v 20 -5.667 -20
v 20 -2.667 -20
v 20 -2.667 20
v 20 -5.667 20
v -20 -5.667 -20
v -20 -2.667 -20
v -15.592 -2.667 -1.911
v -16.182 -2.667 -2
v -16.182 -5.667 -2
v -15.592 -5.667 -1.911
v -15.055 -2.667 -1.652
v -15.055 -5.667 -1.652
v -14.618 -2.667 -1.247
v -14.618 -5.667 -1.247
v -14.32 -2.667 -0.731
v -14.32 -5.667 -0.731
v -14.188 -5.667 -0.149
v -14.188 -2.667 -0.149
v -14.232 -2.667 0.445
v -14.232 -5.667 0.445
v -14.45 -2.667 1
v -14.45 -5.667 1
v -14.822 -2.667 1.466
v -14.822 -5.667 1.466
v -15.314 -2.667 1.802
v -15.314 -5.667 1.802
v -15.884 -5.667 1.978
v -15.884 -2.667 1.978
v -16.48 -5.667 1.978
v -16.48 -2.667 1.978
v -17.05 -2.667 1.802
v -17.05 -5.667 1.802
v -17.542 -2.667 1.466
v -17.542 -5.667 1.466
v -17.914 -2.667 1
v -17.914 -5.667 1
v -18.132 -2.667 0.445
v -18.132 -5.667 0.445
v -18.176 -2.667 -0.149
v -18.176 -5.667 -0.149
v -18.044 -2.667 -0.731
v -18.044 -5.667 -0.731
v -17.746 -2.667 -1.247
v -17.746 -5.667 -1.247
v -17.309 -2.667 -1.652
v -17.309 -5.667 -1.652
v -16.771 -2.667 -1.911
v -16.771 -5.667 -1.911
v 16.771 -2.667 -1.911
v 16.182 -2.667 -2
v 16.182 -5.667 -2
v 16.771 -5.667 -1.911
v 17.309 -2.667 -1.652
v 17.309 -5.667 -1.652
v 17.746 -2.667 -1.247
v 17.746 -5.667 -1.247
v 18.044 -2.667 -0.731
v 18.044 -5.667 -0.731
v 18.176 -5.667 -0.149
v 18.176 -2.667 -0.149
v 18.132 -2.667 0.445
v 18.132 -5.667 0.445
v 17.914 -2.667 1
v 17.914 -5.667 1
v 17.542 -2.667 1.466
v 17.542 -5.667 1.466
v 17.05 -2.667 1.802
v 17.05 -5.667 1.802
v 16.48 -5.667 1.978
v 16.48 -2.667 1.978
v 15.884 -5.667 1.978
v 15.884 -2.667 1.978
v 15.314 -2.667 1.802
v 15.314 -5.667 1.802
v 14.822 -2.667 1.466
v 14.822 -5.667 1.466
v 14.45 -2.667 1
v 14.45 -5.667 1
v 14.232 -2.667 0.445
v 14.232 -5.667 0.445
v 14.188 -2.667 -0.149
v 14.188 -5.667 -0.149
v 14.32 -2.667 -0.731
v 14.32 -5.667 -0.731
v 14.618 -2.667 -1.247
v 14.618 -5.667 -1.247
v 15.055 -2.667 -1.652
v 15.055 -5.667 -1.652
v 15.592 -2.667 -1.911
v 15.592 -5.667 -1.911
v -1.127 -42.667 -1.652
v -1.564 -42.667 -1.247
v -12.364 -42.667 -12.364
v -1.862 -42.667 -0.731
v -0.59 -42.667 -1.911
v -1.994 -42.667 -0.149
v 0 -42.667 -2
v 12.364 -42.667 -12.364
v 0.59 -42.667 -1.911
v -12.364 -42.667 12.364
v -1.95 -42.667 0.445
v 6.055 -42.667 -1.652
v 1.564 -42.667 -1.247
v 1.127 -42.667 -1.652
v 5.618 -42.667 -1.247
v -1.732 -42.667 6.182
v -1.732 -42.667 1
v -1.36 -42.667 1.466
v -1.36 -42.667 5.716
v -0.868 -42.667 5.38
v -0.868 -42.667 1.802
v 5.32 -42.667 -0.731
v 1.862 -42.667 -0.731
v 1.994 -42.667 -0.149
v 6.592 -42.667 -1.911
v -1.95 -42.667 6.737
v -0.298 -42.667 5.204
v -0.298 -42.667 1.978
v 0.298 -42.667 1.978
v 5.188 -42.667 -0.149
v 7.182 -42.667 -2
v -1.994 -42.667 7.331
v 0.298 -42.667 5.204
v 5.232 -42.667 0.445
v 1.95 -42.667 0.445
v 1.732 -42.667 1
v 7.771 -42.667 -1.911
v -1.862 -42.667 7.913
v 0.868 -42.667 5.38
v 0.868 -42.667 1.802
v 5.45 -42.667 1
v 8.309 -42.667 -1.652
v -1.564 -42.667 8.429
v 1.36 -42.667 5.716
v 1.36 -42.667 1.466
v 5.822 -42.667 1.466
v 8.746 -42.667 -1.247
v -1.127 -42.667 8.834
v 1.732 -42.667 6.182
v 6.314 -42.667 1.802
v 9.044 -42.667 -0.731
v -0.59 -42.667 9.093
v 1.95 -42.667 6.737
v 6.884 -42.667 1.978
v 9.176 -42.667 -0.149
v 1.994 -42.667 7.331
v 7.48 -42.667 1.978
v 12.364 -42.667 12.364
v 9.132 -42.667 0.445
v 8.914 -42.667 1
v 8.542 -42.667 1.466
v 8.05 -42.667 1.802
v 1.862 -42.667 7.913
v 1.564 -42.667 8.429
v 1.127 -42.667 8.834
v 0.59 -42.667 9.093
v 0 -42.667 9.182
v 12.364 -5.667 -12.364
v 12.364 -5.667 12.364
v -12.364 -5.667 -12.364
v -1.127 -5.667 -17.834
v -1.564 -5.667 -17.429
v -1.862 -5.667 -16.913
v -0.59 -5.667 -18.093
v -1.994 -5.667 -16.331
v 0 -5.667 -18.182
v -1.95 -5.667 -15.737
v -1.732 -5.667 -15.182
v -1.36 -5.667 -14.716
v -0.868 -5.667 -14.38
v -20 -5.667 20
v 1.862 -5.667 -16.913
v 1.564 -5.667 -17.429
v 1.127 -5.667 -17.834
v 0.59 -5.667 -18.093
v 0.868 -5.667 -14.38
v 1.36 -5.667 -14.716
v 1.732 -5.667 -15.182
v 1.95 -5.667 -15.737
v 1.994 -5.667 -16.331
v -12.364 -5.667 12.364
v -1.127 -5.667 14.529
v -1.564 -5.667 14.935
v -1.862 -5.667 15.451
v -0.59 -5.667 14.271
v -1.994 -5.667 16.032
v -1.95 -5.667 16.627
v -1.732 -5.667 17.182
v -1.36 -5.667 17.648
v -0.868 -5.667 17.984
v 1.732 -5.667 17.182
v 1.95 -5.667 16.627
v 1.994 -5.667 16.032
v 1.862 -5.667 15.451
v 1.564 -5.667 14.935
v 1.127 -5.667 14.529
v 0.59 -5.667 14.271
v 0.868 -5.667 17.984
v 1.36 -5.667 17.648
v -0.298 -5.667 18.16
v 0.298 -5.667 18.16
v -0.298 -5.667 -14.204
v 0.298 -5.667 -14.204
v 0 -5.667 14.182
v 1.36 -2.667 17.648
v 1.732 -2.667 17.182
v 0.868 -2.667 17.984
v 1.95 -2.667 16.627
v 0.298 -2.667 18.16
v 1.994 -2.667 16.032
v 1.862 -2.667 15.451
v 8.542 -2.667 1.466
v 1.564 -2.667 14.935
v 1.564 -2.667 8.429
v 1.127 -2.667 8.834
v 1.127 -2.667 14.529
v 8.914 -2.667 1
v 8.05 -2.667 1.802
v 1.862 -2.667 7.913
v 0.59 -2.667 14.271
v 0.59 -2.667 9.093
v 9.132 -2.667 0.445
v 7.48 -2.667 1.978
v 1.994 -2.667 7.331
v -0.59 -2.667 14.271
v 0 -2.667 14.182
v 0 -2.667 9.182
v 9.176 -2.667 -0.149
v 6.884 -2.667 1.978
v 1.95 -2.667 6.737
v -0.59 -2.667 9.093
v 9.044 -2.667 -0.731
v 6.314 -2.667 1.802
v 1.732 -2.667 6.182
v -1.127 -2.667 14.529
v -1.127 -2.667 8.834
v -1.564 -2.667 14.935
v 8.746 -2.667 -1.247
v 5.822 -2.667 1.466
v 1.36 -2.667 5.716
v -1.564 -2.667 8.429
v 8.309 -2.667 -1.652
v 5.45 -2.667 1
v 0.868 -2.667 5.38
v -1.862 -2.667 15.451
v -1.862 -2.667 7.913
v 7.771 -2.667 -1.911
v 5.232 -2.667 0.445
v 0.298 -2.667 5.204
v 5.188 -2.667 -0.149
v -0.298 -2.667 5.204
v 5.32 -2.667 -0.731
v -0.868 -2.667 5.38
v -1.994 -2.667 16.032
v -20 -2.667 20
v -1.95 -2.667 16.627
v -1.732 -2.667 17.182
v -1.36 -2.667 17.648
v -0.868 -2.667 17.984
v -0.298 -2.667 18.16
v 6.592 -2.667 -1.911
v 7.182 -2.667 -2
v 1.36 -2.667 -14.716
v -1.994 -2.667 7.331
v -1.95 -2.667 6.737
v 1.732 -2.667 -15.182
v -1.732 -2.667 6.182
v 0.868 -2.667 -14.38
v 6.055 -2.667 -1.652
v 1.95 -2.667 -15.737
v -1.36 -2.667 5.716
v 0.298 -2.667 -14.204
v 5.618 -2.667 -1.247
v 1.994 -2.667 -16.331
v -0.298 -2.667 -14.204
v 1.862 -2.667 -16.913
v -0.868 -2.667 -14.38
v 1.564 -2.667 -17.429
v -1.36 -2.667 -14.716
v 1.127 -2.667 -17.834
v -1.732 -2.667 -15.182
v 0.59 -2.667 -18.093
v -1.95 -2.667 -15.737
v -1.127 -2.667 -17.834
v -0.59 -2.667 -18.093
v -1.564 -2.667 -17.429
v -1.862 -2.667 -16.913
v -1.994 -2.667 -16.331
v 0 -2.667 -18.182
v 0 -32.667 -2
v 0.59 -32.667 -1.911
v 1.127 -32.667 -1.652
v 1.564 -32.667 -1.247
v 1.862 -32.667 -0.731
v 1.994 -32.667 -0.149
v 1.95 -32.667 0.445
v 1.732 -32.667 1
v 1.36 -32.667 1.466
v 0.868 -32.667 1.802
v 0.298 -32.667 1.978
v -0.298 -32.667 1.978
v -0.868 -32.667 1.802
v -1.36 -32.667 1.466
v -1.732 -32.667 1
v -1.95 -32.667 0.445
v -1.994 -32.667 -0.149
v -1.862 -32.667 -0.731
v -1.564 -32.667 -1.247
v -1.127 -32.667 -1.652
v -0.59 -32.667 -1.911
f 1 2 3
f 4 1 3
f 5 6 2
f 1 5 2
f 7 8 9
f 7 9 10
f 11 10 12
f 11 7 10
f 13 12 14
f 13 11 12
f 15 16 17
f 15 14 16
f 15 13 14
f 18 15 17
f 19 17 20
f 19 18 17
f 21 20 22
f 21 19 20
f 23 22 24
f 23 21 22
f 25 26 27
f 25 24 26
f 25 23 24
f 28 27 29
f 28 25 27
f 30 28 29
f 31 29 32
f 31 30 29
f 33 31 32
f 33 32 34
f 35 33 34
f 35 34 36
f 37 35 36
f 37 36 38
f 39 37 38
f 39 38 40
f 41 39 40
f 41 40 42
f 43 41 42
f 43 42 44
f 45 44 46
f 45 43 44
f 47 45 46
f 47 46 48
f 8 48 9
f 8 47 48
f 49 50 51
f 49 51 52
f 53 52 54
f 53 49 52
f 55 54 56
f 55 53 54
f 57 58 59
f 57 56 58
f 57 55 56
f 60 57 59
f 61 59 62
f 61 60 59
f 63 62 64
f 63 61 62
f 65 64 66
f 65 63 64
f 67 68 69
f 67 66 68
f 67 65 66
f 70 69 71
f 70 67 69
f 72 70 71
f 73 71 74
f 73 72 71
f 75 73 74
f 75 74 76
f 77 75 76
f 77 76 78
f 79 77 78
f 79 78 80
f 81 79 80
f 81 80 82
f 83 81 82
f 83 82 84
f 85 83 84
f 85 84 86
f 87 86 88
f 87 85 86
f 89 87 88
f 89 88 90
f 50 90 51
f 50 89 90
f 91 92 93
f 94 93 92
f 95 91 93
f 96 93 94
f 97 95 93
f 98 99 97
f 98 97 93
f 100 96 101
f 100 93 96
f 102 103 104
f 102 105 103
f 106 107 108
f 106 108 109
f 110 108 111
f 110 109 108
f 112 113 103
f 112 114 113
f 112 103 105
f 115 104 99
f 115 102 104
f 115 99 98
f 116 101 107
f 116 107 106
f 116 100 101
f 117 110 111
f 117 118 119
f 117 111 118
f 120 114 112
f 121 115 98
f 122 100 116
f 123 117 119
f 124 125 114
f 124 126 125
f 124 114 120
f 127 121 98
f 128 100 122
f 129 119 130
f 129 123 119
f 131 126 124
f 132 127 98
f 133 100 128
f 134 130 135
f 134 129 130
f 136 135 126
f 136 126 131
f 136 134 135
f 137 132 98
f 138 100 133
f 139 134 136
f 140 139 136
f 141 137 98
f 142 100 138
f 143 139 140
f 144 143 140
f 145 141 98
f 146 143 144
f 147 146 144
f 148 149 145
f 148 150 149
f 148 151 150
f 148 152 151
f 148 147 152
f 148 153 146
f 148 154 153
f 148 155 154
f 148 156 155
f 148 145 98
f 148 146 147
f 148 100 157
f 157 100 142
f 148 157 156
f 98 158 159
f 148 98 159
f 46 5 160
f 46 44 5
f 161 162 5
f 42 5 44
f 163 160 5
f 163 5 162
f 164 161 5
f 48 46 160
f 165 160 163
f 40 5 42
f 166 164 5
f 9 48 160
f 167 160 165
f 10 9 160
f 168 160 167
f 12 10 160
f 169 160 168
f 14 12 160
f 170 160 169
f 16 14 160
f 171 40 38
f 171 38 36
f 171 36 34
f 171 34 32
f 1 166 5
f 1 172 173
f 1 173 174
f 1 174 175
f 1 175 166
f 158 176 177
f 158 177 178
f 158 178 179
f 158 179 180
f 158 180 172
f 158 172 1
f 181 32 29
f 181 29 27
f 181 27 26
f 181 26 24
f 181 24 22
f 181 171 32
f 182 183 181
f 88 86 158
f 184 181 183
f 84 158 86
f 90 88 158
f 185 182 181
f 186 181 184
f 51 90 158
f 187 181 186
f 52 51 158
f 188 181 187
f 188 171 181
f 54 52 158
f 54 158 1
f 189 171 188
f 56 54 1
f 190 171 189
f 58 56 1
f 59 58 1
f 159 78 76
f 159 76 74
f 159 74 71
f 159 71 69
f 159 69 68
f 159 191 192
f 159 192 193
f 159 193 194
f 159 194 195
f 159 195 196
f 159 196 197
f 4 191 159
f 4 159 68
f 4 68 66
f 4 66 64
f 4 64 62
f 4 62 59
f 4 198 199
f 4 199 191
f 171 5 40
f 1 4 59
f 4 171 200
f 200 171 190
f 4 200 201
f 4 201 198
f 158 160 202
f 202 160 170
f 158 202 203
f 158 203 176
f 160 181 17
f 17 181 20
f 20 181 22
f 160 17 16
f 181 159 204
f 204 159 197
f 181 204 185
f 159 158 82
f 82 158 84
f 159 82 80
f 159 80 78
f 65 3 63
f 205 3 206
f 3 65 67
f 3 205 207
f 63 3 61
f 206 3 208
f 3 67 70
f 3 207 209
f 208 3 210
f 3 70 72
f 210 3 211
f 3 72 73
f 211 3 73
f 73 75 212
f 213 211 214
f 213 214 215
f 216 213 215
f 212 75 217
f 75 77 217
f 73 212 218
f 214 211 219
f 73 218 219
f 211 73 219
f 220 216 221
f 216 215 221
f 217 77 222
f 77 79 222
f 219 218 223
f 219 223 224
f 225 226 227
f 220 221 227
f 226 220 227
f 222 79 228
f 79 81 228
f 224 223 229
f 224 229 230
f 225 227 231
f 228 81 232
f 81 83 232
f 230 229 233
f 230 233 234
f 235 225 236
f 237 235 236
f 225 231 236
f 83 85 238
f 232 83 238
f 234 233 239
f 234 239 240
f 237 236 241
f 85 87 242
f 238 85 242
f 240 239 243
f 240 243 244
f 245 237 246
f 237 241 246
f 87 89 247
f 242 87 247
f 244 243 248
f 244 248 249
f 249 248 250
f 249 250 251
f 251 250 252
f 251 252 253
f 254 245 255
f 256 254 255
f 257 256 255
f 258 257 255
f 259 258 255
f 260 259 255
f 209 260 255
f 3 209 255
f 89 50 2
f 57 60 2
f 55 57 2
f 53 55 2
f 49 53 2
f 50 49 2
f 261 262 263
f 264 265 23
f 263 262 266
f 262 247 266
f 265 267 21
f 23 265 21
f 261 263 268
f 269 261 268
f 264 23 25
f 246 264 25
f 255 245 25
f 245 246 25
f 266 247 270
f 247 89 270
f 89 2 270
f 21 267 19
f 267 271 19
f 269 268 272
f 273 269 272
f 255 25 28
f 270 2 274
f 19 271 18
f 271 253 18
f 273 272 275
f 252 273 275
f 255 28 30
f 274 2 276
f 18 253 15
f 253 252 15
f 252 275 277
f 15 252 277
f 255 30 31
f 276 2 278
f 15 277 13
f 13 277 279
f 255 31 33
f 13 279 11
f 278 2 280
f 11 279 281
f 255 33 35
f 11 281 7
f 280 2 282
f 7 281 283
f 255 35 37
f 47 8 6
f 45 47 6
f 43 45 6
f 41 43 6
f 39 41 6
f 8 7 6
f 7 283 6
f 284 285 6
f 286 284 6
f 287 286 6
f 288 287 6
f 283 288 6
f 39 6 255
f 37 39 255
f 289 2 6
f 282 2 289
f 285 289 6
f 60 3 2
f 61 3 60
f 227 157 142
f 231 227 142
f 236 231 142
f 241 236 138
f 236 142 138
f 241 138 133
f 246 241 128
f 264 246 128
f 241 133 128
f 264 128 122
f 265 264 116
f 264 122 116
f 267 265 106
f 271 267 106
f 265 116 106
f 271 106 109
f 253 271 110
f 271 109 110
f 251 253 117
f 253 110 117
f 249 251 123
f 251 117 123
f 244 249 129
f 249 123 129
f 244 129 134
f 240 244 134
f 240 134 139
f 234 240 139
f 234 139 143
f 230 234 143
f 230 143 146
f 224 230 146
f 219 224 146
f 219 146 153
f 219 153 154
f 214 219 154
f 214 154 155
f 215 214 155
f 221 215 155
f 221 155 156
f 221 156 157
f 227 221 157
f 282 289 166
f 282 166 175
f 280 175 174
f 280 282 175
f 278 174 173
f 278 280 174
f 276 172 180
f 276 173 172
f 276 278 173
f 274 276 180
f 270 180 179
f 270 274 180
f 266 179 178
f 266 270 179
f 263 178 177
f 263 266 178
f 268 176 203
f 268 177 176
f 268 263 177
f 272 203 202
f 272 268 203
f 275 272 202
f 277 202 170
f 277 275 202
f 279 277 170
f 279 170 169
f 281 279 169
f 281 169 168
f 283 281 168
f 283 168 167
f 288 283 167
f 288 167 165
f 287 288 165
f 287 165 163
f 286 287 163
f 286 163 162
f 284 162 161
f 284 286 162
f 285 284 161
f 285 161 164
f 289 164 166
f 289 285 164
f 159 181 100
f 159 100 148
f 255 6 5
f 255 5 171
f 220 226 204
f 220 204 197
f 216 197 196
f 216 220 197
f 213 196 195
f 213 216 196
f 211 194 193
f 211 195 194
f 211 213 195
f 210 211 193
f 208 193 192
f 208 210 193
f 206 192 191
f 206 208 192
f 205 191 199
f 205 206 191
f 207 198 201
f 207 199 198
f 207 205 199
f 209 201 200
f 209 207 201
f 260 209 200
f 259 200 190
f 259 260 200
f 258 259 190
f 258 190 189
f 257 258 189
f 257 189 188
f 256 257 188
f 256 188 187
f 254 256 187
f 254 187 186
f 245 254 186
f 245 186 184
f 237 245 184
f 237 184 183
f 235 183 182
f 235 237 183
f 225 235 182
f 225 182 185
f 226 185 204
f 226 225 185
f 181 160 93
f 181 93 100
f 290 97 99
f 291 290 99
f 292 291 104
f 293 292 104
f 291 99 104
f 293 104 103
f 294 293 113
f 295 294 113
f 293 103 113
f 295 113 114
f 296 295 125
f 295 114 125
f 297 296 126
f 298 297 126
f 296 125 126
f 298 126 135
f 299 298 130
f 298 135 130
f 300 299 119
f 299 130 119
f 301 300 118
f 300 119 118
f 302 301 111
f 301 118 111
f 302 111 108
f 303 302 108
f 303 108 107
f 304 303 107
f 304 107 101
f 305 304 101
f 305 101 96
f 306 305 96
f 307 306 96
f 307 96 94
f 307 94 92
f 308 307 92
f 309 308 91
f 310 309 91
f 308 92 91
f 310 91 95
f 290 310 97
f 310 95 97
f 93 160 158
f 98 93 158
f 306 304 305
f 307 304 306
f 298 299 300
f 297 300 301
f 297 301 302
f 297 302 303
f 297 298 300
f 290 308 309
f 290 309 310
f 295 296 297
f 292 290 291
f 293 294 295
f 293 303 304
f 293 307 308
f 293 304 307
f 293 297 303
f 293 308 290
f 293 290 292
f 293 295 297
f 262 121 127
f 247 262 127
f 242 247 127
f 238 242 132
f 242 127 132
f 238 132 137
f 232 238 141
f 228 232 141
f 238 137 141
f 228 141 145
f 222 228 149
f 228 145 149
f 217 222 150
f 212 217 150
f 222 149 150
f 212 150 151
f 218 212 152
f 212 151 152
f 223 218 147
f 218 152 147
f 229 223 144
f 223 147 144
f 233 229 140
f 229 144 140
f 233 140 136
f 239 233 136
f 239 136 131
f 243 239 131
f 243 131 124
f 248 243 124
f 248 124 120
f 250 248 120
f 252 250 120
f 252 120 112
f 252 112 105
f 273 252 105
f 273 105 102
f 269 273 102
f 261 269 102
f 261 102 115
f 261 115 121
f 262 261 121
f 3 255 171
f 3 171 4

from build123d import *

# Parameters (mm, degrees)
SKETCH1_W                                      = 193.929
SKETCH1_H                                      = 117.602
BOSS_EXTRUDE1_DEPTH                            = 2.667
CUT_EXTRUDE1_DEPTH                             = 0.254
BOSS_EXTRUDE2_DEPTH                            = 0.254
BOSS_EXTRUDE3_DEPTH                            = 1.6002
BOSS_EXTRUDE4_DEPTH                            = 1.6002
BOSS_EXTRUDE5_DEPTH                            = 1.6002
BOSS_EXTRUDE6_DEPTH                            = 1.6002
BOSS_EXTRUDE7_DEPTH                            = 1.6002
SKETCH9_W                                      = 3.683
SKETCH9_H                                      = 3.175
SKETCH10_W                                     = 3.683
SKETCH10_H                                     = 3.175
SKETCH11_W                                     = 3.683
SKETCH11_H                                     = 3.175
SKETCH12_W                                     = 3.683
SKETCH12_H                                     = 3.175
CSK_FOR_M3_FLAT_HEAD_MACHINE_SCREW1_AT_2_COUNT = 2
CSK_FOR_M3_FLAT_HEAD_MACHINE_SCREW1_AT_2_PITCH = 202.702821766
CSK_FOR_M3_FLAT_HEAD_MACHINE_SCREW1_AT_3_COUNT = 2
CSK_FOR_M3_FLAT_HEAD_MACHINE_SCREW1_AT_3_PITCH = 176.276
CSK_FOR_M3_FLAT_HEAD_MACHINE_SCREW1_AT_4_COUNT = 2
CSK_FOR_M3_FLAT_HEAD_MACHINE_SCREW1_AT_4_PITCH = 100.076
FILLET1_R                                      = 5.1562
FILLET2_R                                      = 1.5748
FILLET3_R                                      = 3.9624
FILLET4_R                                      = 4.7498
SKETCH16_W                                     = 24.727732192
SKETCH16_H                                     = 24.727732192
BOSS_EXTRUDE8_DEPTH                            = 40
SKETCH18_W                                     = 40
SKETCH18_H                                     = 40
SKETCH18_W_2                                   = 24.727732192
SKETCH18_H_2                                   = 24.727732192
BOSS_EXTRUDE9_DEPTH                            = 3
CUT_EXTRUDE2_DEPTH                             = 40
CUT_EXTRUDE2_DEPTH_BACK                        = 40
SKETCH17_R                                     = 2
SKETCH19_R                                     = 2
CUT_EXTRUDE3_DEPTH                             = 10
SKETCH20_W                                     = 226.645594452
SKETCH20_H                                     = 139.264160446
SKETCH20_W_2                                   = 98.304113256
SKETCH20_H_2                                   = 70.390599616
CUT_EXTRUDE4_DEPTH                             = 121.248375711
SKETCH21_W                                     = 98.304113256
SKETCH21_H                                     = 2.667
CUT_EXTRUDE5_DEPTH                             = 100.458365049
SKETCH23_R                                     = 2
CUT_EXTRUDE6_DEPTH                             = 49.989794856


with BuildPart() as part:
    # Sketch1 → Boss-Extrude1 (new body)
    with BuildSketch(Plane.XZ.offset(2.667)):
        Rectangle(SKETCH1_W, SKETCH1_H)
    extrude(amount=-BOSS_EXTRUDE1_DEPTH)

    # Sketch2 → Cut-Extrude1 (cut)
    with BuildSketch(Plane.XZ.offset(2.667)):
        Polygon((-74.4728, 55.3085), (-93.472, 36.2712), (-93.472, -36.2712), (-74.4728, -55.3085), (74.4728, -55.3085), (93.472, -36.2712), (93.472, 36.2712), (74.4728, 55.3085), align=None)
    extrude(amount=-CUT_EXTRUDE1_DEPTH, mode=Mode.SUBTRACT)

    # Sketch3 → Boss-Extrude2 (add)
    with BuildSketch(Plane.XZ.offset(2.413)):
        Polygon((92.6846, 35.945510163), (92.6846, -35.945510163), (74.146186127, -54.5211), (-74.146186127, -54.5211), (-92.6846, -35.945510163), (-92.6846, 35.945510163), (-74.146186127, 54.5211), (74.146186127, 54.5211), align=None)
    extrude(amount=BOSS_EXTRUDE2_DEPTH)

    # Sketch4 → Boss-Extrude3 (add)
    with BuildSketch(Plane(origin=(0, 0, 0), x_dir=(-1, 0, 0), z_dir=(0, 1, 0))):
        with BuildLine():
            Line((92.6211, -49.3395), (92.6211, 49.3395))
            ThreePointArc((92.6211, 49.3395), (93.4212, 50.1396), (94.2213, 49.3395))
            Line((94.2213, 49.3395), (94.2213, -49.3395))
            ThreePointArc((94.2213, -49.3395), (93.4212, -50.1396), (92.6211, -49.3395))
        make_face()
    extrude(amount=BOSS_EXTRUDE3_DEPTH)

    # Sketch5 → Boss-Extrude4 (add)
    with BuildSketch(Plane(origin=(0, 0, 0), x_dir=(-1, 0, 0), z_dir=(0, 1, 0))):
        with BuildLine():
            Line((-94.2213, -49.3395), (-94.2213, 49.3395))
            ThreePointArc((-94.2213, 49.3395), (-93.4212, 50.1396), (-92.6211, 49.3395))
            Line((-92.6211, 49.3395), (-92.6211, -49.3395))
            ThreePointArc((-92.6211, -49.3395), (-93.4212, -50.1396), (-94.2213, -49.3395))
        make_face()
    extrude(amount=BOSS_EXTRUDE4_DEPTH)

    # Sketch6 → Boss-Extrude5 (add)
    with BuildSketch(Plane(origin=(0, 0, 0), x_dir=(-1, 0, 0), z_dir=(0, 1, 0))):
        with BuildLine():
            Line((10.4013, -54.4576), (87.5919, -54.4576))
            ThreePointArc((87.5919, -54.4576), (88.392, -55.2577), (87.5919, -56.0578))
            Line((87.5919, -56.0578), (10.4013, -56.0578))
            ThreePointArc((10.4013, -56.0578), (9.6012, -55.2577), (10.4013, -54.4576))
        make_face()
    extrude(amount=BOSS_EXTRUDE5_DEPTH)

    # Sketch7 → Boss-Extrude6 (add)
    with BuildSketch(Plane(origin=(0, 0, 0), x_dir=(-1, 0, 0), z_dir=(0, 1, 0))):
        with BuildLine():
            Line((-87.5919, 56.0578), (87.5919, 56.0578))
            ThreePointArc((87.5919, 56.0578), (88.392, 55.2577), (87.5919, 54.4576))
            Line((87.5919, 54.4576), (-87.5919, 54.4576))
            ThreePointArc((-87.5919, 54.4576), (-88.392, 55.2577), (-87.5919, 56.0578))
        make_face()
    extrude(amount=BOSS_EXTRUDE6_DEPTH)

    # Sketch8 → Boss-Extrude7 (add)
    with BuildSketch(Plane(origin=(0, 0, 0), x_dir=(-1, 0, 0), z_dir=(0, 1, 0))):
        with BuildLine():
            Line((-87.5919, -54.4576), (-10.4013, -54.4576))
            ThreePointArc((-10.4013, -54.4576), (-9.6012, -55.2577), (-10.4013, -56.0578))
            Line((-10.4013, -56.0578), (-87.5919, -56.0578))
            ThreePointArc((-87.5919, -56.0578), (-88.392, -55.2577), (-87.5919, -54.4576))
        make_face()
    extrude(amount=BOSS_EXTRUDE7_DEPTH)

    # Sketch9 → Revolve1 (revolve)
    with BuildSketch(Plane.XY.offset(-50.038), mode=Mode.PRIVATE) as revolve1_sk:
        with Locations((-86.2965, 1.5875)):
            Rectangle(SKETCH9_W, SKETCH9_H)
    revolve(revolve1_sk.sketch.rotate(Axis((-88.138, 3.175, -50.038), (0, -1, 0)), 270), axis=Axis((-88.138, 3.175, -50.038), (0, -1, 0)))

    # Sketch10 → Revolve2 (revolve)
    with BuildSketch(Plane.XY.offset(50.038), mode=Mode.PRIVATE) as revolve2_sk:
        with Locations((89.9795, 1.5875)):
            Rectangle(SKETCH10_W, SKETCH10_H)
    revolve(revolve2_sk.sketch.rotate(Axis((88.138, 3.175, 50.038), (0, -1, 0)), 270), axis=Axis((88.138, 3.175, 50.038), (0, -1, 0)))

    # Sketch11 → Revolve3 (revolve)
    with BuildSketch(Plane.XY.offset(50.038), mode=Mode.PRIVATE) as revolve3_sk:
        with Locations((-86.2965, 1.5875)):
            Rectangle(SKETCH11_W, SKETCH11_H)
    revolve(revolve3_sk.sketch.rotate(Axis((-88.138, 3.175, 50.038), (0, -1, 0)), 270), axis=Axis((-88.138, 3.175, 50.038), (0, -1, 0)))

    # Sketch12 → Revolve4 (revolve)
    with BuildSketch(Plane.XY.offset(-50.038), mode=Mode.PRIVATE) as revolve4_sk:
        with Locations((89.9795, 1.5875)):
            Rectangle(SKETCH12_W, SKETCH12_H)
    revolve(revolve4_sk.sketch.rotate(Axis((88.138, 3.175, -50.038), (0, -1, 0)), 270), axis=Axis((88.138, 3.175, -50.038), (0, -1, 0)))

    # Sketch13 → CSK for M3 Flat Head Machine Screw1 (revolve, cut)
    with BuildSketch(Plane(origin=(88.138, -2.667, -50.038), x_dir=(0, 0, -1), z_dir=(1, 0, 0))):
        Polygon((0, 0), (0, 5.842), (1.6256, 5.842), (1.6256, 3.175), (3.048, 1.538715978), (3.048, 0), align=None)
    csk_for_m3_flat_head_machine_screw1 = revolve(axis=Axis((88.138, -9.017, -50.038), (0, 1, 0)), mode=Mode.SUBTRACT)

    # CSK for M3 Flat Head Machine Screw1 at 2: CSK for M3 Flat Head Machine Screw1 ×2
    with Locations(*[Vector(-0.8696277558645717, 0, 0.4937079766723937) * (i * CSK_FOR_M3_FLAT_HEAD_MACHINE_SCREW1_AT_2_PITCH) for i in range(1, CSK_FOR_M3_FLAT_HEAD_MACHINE_SCREW1_AT_2_COUNT)]):
        add(csk_for_m3_flat_head_machine_screw1, mode=Mode.SUBTRACT)

    # CSK for M3 Flat Head Machine Screw1 at 3: CSK for M3 Flat Head Machine Screw1 ×2
    with Locations(*[(-i * CSK_FOR_M3_FLAT_HEAD_MACHINE_SCREW1_AT_3_PITCH, 0, 0) for i in range(1, CSK_FOR_M3_FLAT_HEAD_MACHINE_SCREW1_AT_3_COUNT)]):
        add(csk_for_m3_flat_head_machine_screw1, mode=Mode.SUBTRACT)

    # CSK for M3 Flat Head Machine Screw1 at 4: CSK for M3 Flat Head Machine Screw1 ×2
    with Locations(*[(0, 0, i * CSK_FOR_M3_FLAT_HEAD_MACHINE_SCREW1_AT_4_PITCH) for i in range(1, CSK_FOR_M3_FLAT_HEAD_MACHINE_SCREW1_AT_4_COUNT)]):
        add(csk_for_m3_flat_head_machine_screw1, mode=Mode.SUBTRACT)

    # Fillet1
    fillet1_edges = [part.edges().sort_by_distance(p)[0] for p in [
        (-96.9645, -1.3335, 58.801),
        (96.9645, -1.3335, 58.801),
        (96.9645, -1.3335, -58.801),
        (-96.9645, -1.3335, -58.801),
    ]]
    fillet(fillet1_edges, radius=FILLET1_R)

    # Fillet2
    fillet2_edges = [part.edges().sort_by_distance(p)[0] for p in [
        (0, -2.667, 58.801),
        (-96.9645, -2.667, 0),
        (0, -2.667, -58.801),
        (96.9645, -2.667, 0),
        (95.454283985, -2.667, -57.290783985),
        (95.454283985, -2.667, 57.290783985),
        (-95.454283985, -2.667, -57.290783985),
        (-95.454283985, -2.667, 57.290783985),
    ]]
    fillet(fillet2_edges, radius=FILLET2_R)

    # Fillet3
    fillet3_edges = [part.edges().sort_by_distance(p)[0] for p in [
        (92.6846, -2.54, 35.945510163),
        (74.146186127, -2.54, 54.5211),
        (-74.146186127, -2.54, 54.5211),
        (-92.6846, -2.54, 35.945510163),
        (-92.6846, -2.54, -35.945510163),
        (-74.146186127, -2.54, -54.5211),
        (74.146186127, -2.54, -54.5211),
        (92.6846, -2.54, -35.945510163),
    ]]
    fillet(fillet3_edges, radius=FILLET3_R)

    # Fillet4
    fillet4_edges = [part.edges().sort_by_distance(p)[0] for p in [
        (-74.4728, -2.54, 55.3085),
        (74.4728, -2.54, 55.3085),
        (93.472, -2.54, 36.2712),
        (93.472, -2.54, -36.2712),
        (74.4728, -2.54, -55.3085),
        (-74.4728, -2.54, -55.3085),
        (-93.472, -2.54, -36.2712),
        (-93.472, -2.54, 36.2712),
    ]]
    fillet(fillet4_edges, radius=FILLET4_R)

    # Sketch16 → Boss-Extrude8 (add)
    with BuildSketch(Plane.XZ.offset(2.667)):
        Rectangle(SKETCH16_W, SKETCH16_H)
    extrude(amount=BOSS_EXTRUDE8_DEPTH)

    # Sketch18 → Boss-Extrude9 (add)
    with BuildSketch(Plane.XZ.offset(2.667)):
        Rectangle(SKETCH18_W, SKETCH18_H)
        Rectangle(SKETCH18_W_2, SKETCH18_H_2, mode=Mode.SUBTRACT)
    extrude(amount=BOSS_EXTRUDE9_DEPTH)

    # Sketch17 → Cut-Extrude2 (cut, two sides: drawn at the far end of the back side and taken through both)
    with BuildSketch(Plane.XZ.offset(2.667).offset(-CUT_EXTRUDE2_DEPTH_BACK)):
        with Locations(Location((-16.181933048, 0, 0), (0, 0, 270))):
            Circle(SKETCH17_R)
        with Locations(Location((0, 16.181933048, 0), (0, 0, 270))):
            Circle(SKETCH17_R)
        with Locations(Location((16.181933048, 0, 0), (0, 0, 270))):
            Circle(SKETCH17_R)
        with Locations(Location((0, -16.181933048, 0), (0, 0, 270))):
            Circle(SKETCH17_R)
    extrude(amount=CUT_EXTRUDE2_DEPTH + CUT_EXTRUDE2_DEPTH_BACK, mode=Mode.SUBTRACT)

    # Sketch19 → Cut-Extrude3 (cut)
    with BuildSketch(Plane.XZ.offset(42.667)):
        with Locations(Location((0, 0, 0), (0, 0, 270))):
            Circle(SKETCH19_R)
    extrude(amount=-CUT_EXTRUDE3_DEPTH, mode=Mode.SUBTRACT)

    # Sketch20 → Cut-Extrude4 (cut, through all)
    with BuildSketch(Plane.XZ.offset(2.667)):
        with Locations((4.399412476, -0.910223271)):
            Rectangle(SKETCH20_W, SKETCH20_H)
        with Locations((-6.674970653, -1.97215042)):
            Rectangle(SKETCH20_W_2, SKETCH20_H_2, mode=Mode.SUBTRACT)
    extrude(amount=-CUT_EXTRUDE4_DEPTH, mode=Mode.SUBTRACT)

    # Sketch21 → Cut-Extrude5 (cut, through all)
    with BuildSketch(Plane(origin=(0, 0, -37.167450228), x_dir=(-1, 0, 0), z_dir=(0, 0, -1))):
        with Locations((6.674970653, -1.3335)):
            Rectangle(SKETCH21_W, SKETCH21_H)
    extrude(amount=-CUT_EXTRUDE5_DEPTH, mode=Mode.SUBTRACT)

    # Sketch23 → Cut-Extrude6 (cut, through all)
    with BuildSketch(Plane.XZ.offset(42.667)):
        with Locations(Location((7.181933048, 0, 0), (0, 0, 270))):
            Circle(SKETCH23_R)
        with Locations(Location((0, 7.181933048, 0), (0, 0, 90))):
            Circle(SKETCH23_R)
    extrude(amount=-CUT_EXTRUDE6_DEPTH, mode=Mode.SUBTRACT)


solid = part.part
